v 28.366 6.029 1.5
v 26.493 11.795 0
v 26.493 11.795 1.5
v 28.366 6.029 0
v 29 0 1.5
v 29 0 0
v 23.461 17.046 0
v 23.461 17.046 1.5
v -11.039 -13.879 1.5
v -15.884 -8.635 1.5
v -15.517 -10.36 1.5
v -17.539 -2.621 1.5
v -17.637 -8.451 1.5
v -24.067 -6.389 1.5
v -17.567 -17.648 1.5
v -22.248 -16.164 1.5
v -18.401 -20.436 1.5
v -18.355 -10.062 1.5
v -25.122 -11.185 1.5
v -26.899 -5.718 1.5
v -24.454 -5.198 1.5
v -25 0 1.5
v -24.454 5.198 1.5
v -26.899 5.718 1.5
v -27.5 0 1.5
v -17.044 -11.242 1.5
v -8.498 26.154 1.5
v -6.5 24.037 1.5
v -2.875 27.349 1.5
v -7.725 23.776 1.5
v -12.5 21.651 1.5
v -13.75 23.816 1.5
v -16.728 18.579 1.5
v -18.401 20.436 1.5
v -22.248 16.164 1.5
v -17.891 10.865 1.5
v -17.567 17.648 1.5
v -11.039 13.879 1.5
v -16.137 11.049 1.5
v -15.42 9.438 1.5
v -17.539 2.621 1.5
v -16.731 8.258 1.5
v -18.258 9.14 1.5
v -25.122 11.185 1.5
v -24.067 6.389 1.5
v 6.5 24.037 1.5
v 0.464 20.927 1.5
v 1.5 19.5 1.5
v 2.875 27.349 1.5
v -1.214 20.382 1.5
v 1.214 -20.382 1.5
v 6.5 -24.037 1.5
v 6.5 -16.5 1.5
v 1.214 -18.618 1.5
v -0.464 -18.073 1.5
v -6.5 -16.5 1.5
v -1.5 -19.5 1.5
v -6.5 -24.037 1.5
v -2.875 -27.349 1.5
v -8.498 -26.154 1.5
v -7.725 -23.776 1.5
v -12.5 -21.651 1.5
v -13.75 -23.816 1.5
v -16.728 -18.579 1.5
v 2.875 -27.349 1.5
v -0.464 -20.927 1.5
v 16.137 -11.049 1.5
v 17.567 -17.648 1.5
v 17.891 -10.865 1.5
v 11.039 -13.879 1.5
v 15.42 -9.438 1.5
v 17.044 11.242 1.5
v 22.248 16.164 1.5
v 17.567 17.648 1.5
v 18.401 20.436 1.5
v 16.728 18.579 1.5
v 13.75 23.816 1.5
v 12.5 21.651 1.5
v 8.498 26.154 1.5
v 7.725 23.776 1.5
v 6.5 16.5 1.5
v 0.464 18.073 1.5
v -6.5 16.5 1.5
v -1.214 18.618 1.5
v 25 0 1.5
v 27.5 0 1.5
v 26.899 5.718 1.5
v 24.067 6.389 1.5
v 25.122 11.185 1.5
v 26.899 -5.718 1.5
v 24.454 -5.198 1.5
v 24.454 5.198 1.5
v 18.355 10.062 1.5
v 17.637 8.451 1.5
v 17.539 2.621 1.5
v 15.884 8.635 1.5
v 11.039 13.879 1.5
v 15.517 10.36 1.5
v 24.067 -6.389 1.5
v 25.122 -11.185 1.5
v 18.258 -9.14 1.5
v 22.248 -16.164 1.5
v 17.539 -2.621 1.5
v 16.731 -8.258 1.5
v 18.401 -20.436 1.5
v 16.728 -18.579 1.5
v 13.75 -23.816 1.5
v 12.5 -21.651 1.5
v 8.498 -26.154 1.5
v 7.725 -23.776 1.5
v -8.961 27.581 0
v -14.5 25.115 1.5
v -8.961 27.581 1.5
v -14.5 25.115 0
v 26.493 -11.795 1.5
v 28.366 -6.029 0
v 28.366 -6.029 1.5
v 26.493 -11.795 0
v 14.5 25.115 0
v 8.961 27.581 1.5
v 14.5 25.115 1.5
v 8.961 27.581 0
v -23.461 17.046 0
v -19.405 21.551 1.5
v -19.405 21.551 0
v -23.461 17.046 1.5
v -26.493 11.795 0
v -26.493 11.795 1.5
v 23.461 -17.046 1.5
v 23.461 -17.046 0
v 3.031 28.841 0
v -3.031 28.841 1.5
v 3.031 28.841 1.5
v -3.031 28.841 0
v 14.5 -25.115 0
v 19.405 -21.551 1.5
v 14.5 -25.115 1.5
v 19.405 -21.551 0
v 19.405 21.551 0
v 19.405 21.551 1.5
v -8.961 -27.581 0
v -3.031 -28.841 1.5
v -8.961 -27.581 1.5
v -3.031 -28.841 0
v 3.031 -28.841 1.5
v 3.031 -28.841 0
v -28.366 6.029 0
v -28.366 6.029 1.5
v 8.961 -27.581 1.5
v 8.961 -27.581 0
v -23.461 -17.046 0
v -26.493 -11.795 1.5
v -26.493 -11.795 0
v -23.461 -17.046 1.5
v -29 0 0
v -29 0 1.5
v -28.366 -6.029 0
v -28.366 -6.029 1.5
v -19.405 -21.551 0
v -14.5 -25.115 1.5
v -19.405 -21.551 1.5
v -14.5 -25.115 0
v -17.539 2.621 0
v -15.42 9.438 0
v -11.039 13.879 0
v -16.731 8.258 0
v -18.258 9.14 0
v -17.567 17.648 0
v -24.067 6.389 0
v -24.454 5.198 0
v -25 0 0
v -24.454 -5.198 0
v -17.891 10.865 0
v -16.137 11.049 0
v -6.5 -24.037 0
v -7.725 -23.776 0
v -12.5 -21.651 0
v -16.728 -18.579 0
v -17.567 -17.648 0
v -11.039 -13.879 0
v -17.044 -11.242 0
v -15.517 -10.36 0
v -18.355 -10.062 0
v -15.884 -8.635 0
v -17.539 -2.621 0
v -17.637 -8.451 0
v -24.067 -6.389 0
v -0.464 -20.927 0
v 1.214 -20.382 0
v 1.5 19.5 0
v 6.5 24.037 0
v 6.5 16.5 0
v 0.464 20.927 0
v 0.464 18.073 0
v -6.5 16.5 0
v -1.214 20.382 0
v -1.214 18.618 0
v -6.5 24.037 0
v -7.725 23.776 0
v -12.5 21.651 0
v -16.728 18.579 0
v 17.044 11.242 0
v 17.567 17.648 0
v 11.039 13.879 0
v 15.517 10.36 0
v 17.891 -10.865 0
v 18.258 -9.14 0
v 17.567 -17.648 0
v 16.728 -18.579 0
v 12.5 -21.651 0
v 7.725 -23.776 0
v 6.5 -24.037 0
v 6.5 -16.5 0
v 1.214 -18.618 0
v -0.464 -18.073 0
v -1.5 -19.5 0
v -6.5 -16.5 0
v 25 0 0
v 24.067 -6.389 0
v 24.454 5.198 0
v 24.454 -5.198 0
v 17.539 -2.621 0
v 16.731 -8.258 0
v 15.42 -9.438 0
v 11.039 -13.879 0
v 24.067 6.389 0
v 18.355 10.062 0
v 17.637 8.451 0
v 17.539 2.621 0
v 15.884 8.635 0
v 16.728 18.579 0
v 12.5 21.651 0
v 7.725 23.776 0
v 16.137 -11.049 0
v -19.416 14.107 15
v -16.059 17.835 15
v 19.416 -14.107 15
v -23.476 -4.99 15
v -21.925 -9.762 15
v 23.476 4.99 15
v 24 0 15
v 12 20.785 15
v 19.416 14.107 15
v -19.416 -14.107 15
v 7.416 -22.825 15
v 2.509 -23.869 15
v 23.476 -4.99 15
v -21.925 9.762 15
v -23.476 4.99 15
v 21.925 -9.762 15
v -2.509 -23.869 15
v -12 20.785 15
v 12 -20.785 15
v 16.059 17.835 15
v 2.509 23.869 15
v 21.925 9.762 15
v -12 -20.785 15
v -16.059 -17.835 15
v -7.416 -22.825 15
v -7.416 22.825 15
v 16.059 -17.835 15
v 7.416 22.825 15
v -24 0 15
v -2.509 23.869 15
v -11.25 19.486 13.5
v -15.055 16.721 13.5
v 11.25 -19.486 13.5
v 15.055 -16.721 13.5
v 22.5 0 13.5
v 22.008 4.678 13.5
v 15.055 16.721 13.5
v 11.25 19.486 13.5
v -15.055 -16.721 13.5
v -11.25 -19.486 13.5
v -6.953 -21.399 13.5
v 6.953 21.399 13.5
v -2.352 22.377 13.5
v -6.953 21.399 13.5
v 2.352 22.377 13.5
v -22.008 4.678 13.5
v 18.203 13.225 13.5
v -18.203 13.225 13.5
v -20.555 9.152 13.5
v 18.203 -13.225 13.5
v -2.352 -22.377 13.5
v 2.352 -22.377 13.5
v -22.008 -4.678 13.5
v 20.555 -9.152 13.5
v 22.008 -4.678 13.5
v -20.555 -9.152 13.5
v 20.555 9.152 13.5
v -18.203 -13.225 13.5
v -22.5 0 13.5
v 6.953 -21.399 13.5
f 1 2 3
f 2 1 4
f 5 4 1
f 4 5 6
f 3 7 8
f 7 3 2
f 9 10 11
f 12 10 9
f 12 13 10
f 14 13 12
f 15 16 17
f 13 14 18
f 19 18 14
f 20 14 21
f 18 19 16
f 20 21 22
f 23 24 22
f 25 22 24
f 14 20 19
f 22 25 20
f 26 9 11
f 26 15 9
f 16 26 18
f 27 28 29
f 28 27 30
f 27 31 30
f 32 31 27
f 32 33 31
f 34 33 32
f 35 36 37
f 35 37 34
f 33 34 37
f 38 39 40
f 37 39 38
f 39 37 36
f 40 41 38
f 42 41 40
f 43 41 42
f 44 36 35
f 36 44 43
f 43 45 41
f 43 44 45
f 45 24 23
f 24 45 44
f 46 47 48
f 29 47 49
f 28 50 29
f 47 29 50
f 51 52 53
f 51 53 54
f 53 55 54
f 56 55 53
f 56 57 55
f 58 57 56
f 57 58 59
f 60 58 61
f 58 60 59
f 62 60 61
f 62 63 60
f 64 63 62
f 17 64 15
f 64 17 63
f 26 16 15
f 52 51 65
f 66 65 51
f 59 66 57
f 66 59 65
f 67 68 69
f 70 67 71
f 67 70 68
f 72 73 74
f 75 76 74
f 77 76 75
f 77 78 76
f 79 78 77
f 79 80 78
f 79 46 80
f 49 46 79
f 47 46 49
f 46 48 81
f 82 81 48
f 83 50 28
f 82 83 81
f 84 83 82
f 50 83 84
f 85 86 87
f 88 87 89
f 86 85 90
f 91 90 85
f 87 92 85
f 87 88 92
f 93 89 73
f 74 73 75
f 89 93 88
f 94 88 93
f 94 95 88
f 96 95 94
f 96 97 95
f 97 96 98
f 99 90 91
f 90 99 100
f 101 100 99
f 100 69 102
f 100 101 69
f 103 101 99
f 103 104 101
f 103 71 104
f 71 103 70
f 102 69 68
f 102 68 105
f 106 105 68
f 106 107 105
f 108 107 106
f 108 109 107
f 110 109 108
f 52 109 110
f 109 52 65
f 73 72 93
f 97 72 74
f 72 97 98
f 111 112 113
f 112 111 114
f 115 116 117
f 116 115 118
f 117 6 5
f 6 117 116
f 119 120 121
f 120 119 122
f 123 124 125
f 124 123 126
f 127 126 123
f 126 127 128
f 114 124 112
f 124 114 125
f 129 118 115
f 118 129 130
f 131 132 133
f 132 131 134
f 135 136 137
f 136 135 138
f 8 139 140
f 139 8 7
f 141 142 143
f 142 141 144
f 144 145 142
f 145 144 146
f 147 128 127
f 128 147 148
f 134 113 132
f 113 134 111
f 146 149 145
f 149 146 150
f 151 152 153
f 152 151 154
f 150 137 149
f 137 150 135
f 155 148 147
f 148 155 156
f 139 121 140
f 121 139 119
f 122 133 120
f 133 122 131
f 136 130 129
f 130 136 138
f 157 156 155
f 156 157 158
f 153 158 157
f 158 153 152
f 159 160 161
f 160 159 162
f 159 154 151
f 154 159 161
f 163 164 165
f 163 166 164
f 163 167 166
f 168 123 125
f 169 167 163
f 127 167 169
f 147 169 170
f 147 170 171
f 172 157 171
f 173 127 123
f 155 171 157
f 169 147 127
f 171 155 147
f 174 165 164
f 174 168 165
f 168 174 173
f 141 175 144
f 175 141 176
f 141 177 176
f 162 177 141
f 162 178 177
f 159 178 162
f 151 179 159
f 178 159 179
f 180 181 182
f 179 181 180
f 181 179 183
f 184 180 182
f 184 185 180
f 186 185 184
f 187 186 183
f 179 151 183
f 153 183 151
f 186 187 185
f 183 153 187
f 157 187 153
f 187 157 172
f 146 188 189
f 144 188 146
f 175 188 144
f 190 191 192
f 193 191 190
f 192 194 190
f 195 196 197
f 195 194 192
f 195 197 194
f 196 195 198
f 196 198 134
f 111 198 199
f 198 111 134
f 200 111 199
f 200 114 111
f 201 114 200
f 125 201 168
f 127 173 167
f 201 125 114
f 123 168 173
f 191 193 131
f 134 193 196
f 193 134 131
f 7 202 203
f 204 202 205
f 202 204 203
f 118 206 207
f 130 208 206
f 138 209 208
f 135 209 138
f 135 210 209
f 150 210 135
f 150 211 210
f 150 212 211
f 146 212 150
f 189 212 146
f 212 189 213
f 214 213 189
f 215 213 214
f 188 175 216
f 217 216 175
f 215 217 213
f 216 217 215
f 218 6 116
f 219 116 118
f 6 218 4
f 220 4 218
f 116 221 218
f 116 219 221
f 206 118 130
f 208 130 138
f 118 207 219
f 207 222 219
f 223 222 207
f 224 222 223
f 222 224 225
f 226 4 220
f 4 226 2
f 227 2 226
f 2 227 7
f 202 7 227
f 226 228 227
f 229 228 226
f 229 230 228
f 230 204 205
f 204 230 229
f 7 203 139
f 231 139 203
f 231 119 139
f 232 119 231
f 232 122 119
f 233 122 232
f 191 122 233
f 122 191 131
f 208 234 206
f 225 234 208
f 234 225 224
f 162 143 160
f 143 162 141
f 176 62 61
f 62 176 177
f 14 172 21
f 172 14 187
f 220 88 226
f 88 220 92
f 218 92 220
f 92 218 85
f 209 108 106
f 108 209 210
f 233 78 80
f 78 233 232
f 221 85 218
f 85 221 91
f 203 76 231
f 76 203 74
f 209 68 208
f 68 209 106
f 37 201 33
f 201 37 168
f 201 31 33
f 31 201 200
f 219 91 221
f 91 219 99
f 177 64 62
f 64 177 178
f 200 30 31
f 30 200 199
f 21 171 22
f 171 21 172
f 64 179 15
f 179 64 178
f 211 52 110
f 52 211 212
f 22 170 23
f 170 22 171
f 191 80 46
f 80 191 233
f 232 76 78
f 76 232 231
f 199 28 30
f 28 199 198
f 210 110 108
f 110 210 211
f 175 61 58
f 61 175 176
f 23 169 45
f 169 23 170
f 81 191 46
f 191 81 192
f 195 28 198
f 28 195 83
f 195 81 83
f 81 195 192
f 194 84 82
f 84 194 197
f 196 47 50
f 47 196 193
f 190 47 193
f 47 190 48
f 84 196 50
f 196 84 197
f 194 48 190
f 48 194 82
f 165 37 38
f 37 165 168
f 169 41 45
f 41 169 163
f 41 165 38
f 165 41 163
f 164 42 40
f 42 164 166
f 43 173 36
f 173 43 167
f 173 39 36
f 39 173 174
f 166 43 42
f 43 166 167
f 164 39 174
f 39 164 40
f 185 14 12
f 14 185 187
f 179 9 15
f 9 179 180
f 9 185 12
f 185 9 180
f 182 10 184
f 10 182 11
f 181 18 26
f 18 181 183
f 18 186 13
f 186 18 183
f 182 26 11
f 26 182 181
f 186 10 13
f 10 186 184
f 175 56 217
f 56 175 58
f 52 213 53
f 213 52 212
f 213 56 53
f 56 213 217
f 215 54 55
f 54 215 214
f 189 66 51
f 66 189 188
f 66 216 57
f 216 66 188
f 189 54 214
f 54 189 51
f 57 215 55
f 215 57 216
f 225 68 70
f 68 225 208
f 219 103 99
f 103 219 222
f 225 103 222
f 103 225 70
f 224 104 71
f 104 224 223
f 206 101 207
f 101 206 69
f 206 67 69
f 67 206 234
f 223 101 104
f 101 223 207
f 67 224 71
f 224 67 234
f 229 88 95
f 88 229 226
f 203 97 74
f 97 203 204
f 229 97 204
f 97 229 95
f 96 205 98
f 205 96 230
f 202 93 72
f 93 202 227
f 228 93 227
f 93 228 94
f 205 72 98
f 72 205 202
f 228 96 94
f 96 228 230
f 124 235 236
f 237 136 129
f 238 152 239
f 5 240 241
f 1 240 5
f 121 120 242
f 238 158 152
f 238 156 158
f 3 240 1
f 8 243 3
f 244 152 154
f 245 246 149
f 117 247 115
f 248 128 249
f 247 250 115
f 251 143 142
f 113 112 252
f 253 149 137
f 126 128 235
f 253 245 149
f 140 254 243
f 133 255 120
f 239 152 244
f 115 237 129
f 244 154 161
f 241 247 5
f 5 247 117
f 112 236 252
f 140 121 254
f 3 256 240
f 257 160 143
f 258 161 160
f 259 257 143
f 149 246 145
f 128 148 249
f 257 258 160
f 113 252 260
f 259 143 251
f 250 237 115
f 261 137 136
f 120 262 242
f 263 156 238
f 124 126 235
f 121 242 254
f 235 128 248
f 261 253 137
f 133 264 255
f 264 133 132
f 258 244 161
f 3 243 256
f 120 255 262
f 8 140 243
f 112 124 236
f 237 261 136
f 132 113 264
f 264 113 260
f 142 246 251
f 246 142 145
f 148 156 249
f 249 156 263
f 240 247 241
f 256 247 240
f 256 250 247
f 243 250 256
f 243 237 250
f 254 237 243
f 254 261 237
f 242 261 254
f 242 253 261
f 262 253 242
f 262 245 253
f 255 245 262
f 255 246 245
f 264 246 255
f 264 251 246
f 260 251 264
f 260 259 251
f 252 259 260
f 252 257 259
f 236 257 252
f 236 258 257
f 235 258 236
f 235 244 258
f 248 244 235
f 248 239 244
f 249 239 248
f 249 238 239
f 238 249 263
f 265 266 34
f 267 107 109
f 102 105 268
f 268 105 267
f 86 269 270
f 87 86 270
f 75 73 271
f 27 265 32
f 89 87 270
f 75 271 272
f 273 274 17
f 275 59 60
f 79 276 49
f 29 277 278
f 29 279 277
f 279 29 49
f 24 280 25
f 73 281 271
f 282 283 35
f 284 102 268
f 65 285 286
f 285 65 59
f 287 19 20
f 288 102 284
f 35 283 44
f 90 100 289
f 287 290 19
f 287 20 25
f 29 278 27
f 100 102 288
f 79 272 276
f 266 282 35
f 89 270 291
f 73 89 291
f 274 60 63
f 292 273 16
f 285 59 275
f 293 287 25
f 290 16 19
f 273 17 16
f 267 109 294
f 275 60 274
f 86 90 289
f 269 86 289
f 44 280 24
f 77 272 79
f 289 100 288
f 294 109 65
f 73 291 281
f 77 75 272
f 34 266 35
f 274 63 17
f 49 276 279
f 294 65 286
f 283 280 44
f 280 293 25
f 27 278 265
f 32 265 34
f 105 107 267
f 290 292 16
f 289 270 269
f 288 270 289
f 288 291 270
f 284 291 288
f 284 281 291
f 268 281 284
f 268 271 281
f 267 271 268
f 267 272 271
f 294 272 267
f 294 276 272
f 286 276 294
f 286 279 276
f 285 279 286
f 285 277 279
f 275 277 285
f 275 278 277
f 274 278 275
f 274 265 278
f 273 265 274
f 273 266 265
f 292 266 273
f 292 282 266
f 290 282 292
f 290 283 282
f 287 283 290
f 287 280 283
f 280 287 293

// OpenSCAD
outer_cap_dia = 58; // Outer diameter of a cap
base_cap_height = 1.5;
connector_hole_dia = 3; // Dia of the connector hole
connector_hole_offset = 3;
connector_size = 7.5;
lock_holder_width = 13;
cap_height = 15;
cap_top_dia = 48;

union()
{
    difference()
    {
        cylinder(h = base_cap_height, r = outer_cap_dia / 2);
        cylinder(h = base_cap_height, r = (outer_cap_dia / 2) - 4);
    }
    for(i = [0 : 360 / 6 : 360])
    {
        rotate([0, 0, i])
        {
            difference()
            {
                translate([-lock_holder_width / 2, outer_cap_dia / 2 - connector_size - 5, 0])
                {
                    cube([lock_holder_width, connector_size + 1, base_cap_height]);
                }
                translate([0, outer_cap_dia / 2 - connector_size - 5 + connector_hole_offset, 0])
                {
                    cylinder(h = base_cap_height, r = connector_hole_dia / 2);
                }
            }
        }
    }
    translate([0, 0, base_cap_height])
    {
        difference()
        {
            cylinder(h = cap_height - base_cap_height, r1 = outer_cap_dia / 2, r2 = cap_top_dia / 2);
            cylinder(h = cap_height - base_cap_height * 2, r1 = outer_cap_dia / 2 - base_cap_height, r2 = cap_top_dia / 2 - base_cap_height);
        }
    }
}
